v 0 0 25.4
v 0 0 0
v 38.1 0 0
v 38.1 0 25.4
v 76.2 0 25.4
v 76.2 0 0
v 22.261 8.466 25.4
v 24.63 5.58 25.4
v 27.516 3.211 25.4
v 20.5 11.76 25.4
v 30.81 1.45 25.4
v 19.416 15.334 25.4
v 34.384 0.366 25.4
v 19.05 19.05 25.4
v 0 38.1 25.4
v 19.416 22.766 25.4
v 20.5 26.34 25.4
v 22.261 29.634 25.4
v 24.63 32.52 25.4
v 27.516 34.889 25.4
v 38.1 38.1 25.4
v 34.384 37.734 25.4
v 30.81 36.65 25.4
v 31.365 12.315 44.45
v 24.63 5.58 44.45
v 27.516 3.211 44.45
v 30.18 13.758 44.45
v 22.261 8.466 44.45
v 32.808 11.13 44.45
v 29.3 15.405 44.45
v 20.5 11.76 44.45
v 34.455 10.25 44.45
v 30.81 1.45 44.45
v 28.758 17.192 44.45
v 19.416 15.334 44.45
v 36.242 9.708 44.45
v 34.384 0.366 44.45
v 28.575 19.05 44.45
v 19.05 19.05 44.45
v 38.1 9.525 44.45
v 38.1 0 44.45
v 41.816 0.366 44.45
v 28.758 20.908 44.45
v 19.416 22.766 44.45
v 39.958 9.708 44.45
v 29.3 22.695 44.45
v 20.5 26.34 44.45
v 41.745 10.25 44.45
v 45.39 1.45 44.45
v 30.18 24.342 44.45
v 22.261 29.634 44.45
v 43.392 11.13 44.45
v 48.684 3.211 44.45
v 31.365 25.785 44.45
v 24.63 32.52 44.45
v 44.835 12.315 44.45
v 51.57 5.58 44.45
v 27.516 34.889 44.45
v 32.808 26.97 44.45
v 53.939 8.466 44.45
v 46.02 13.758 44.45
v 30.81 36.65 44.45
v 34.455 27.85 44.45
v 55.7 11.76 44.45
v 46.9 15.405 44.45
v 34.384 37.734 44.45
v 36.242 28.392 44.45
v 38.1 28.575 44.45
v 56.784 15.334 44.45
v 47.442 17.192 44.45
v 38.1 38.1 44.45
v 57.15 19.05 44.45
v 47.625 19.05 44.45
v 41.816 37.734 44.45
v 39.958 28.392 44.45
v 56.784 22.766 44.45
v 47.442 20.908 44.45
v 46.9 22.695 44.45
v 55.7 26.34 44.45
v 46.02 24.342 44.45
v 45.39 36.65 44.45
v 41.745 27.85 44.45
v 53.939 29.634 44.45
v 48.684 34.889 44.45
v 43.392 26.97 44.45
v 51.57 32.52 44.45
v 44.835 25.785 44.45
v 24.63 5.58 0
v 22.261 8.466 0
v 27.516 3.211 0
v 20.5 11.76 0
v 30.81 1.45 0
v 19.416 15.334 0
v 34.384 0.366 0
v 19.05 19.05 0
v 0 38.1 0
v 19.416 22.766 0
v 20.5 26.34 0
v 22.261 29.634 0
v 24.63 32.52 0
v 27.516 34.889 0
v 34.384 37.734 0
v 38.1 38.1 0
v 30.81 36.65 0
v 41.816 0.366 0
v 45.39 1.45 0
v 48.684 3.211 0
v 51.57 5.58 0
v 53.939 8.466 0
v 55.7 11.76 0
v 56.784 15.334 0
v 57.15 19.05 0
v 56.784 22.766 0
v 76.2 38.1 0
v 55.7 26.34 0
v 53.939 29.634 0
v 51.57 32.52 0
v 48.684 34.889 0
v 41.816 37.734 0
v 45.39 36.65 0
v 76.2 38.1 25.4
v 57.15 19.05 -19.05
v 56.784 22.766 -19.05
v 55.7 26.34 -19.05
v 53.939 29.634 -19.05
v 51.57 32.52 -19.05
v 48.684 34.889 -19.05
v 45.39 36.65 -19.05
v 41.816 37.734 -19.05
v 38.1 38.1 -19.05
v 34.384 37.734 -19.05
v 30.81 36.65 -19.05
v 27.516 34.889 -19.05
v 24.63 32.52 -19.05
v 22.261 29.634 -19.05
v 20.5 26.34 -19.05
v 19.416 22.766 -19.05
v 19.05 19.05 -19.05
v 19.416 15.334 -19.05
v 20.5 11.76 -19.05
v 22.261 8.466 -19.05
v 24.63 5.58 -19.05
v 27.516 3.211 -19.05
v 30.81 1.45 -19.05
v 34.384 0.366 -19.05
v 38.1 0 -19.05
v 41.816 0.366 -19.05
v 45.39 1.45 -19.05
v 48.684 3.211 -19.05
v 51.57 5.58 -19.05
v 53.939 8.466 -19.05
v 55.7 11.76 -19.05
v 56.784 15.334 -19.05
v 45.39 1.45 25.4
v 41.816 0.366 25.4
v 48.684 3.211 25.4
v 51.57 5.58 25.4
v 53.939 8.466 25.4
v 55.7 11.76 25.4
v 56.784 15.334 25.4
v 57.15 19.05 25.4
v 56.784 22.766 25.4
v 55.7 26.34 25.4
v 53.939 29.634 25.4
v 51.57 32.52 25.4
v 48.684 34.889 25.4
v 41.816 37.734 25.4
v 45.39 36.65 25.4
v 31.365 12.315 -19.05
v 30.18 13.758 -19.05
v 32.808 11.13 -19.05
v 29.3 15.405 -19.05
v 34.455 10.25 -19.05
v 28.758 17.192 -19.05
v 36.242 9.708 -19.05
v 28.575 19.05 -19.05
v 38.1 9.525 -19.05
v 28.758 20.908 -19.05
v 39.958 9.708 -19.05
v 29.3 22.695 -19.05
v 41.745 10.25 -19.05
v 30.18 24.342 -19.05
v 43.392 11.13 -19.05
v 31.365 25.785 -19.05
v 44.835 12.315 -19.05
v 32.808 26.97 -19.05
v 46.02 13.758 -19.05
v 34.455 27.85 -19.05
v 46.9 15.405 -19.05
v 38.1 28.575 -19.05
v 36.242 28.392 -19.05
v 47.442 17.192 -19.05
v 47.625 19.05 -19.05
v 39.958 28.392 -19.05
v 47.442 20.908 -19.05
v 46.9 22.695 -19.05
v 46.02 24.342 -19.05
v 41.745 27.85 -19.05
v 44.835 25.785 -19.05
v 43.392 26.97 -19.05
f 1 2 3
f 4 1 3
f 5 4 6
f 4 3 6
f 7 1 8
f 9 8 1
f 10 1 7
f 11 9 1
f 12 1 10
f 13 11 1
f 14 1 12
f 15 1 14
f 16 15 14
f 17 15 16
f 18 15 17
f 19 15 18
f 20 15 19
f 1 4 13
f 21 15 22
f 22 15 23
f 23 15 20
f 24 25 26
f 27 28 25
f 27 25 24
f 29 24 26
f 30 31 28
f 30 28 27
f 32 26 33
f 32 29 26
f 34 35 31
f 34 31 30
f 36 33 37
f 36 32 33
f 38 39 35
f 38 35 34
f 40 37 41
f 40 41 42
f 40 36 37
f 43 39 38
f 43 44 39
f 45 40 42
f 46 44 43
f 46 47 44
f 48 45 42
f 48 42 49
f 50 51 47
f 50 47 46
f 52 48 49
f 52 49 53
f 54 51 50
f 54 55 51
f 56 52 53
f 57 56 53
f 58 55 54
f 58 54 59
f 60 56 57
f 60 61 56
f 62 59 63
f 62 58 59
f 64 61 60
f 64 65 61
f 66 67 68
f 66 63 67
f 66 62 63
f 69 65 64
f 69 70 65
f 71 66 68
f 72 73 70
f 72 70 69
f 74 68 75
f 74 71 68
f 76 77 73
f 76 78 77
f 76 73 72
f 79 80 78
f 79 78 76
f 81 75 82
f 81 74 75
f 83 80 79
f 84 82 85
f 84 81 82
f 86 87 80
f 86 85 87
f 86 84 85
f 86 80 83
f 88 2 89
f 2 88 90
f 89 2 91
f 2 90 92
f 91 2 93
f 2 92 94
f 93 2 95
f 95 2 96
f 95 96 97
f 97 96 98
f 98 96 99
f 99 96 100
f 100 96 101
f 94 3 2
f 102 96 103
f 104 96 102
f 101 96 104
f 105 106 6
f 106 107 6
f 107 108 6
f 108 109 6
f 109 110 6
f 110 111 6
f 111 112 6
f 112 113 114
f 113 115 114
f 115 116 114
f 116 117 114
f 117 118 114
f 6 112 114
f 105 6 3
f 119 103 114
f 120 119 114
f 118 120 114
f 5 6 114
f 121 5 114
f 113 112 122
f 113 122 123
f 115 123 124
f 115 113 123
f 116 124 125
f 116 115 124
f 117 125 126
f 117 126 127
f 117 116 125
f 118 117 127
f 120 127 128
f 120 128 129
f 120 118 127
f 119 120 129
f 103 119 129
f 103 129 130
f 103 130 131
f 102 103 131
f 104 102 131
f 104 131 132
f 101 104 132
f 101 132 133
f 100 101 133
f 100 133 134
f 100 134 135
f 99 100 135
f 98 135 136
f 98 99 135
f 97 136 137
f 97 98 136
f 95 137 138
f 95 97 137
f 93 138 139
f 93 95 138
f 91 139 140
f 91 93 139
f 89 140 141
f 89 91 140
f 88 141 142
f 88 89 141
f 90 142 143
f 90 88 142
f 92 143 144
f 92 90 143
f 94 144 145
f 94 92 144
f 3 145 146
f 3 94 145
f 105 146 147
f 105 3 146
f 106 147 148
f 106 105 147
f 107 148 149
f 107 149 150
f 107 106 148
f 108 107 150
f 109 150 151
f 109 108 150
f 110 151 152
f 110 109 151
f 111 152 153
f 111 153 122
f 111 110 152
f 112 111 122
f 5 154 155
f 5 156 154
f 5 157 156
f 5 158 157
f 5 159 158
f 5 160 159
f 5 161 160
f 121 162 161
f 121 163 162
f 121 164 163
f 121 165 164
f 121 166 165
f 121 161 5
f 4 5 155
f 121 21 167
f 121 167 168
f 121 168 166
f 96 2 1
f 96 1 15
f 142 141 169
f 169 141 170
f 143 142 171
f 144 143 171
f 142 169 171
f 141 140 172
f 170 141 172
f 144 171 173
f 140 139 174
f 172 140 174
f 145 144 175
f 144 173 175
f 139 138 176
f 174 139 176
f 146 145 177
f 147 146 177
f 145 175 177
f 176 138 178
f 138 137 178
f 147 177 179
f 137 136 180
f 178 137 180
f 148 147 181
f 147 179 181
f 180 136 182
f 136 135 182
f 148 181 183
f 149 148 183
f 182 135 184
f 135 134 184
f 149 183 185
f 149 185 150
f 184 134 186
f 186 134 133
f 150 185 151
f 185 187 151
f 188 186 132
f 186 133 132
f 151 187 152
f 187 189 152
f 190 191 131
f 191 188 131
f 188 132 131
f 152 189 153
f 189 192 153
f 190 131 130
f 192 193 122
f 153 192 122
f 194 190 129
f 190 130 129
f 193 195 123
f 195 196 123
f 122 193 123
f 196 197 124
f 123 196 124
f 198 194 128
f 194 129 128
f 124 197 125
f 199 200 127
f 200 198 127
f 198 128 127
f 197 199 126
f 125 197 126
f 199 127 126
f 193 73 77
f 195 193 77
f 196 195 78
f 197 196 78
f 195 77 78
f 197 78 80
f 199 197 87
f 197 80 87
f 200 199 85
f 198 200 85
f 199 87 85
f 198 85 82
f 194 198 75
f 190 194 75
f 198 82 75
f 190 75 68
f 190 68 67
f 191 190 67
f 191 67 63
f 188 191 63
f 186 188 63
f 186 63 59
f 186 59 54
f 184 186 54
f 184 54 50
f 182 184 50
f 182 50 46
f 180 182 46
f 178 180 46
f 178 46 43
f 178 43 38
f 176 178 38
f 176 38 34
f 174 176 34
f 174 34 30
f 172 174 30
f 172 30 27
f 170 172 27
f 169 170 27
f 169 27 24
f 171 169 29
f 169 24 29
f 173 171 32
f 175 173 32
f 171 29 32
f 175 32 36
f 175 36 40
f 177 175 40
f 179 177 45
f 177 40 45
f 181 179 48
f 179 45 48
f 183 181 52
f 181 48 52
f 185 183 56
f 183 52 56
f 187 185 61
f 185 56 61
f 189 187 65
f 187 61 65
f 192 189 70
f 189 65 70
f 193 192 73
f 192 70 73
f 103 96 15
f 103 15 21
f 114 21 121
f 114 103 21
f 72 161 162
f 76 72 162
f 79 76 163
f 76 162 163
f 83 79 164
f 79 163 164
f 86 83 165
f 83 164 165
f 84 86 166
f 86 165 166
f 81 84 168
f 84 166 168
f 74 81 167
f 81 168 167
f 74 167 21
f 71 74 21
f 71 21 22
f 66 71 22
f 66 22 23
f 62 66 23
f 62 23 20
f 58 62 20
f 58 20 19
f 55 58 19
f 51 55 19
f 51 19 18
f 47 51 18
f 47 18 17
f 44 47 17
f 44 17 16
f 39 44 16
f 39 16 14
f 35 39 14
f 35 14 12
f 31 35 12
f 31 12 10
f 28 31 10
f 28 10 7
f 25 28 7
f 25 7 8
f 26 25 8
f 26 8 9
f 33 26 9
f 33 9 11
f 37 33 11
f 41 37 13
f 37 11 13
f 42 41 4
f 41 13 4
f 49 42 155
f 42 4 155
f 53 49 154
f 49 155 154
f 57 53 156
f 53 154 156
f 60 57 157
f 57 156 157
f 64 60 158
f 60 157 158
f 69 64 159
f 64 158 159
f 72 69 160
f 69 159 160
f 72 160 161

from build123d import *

# Parameters (mm, degrees)
F0_W          = 76.2
F0_H          = 38.1
F1_DEPTH      = 25.4
F2_R          = 19.05
F3_DEPTH      = 19.05
F3_DEPTH_BACK = 44.45
F4_R          = 9.525
F5_DEPTH      = 63.501


with BuildPart() as f1:
    # F0 (on Top) → F1 (new body)
    with BuildSketch(Plane.XY):
        with Locations((38.1, 19.05)):
            Rectangle(F0_W, F0_H)
    extrude(amount=F1_DEPTH)

    # F2 (on face) → F3 (join, two sides)
    with BuildSketch(Plane.XY.offset(25.4)) as f3_sk:
        with Locations((38.1, 19.05)):
            Circle(F2_R)
    extrude(amount=F3_DEPTH)
    extrude(f3_sk.sketch, amount=-F3_DEPTH_BACK)

    # F4 (on face) → F5 (cut, through all)
    with BuildSketch(Plane.XY.offset(44.45)):
        with Locations((38.1, 19.05)):
            Circle(F4_R)
    extrude(amount=-F5_DEPTH, mode=Mode.SUBTRACT)


solid = f1.part
